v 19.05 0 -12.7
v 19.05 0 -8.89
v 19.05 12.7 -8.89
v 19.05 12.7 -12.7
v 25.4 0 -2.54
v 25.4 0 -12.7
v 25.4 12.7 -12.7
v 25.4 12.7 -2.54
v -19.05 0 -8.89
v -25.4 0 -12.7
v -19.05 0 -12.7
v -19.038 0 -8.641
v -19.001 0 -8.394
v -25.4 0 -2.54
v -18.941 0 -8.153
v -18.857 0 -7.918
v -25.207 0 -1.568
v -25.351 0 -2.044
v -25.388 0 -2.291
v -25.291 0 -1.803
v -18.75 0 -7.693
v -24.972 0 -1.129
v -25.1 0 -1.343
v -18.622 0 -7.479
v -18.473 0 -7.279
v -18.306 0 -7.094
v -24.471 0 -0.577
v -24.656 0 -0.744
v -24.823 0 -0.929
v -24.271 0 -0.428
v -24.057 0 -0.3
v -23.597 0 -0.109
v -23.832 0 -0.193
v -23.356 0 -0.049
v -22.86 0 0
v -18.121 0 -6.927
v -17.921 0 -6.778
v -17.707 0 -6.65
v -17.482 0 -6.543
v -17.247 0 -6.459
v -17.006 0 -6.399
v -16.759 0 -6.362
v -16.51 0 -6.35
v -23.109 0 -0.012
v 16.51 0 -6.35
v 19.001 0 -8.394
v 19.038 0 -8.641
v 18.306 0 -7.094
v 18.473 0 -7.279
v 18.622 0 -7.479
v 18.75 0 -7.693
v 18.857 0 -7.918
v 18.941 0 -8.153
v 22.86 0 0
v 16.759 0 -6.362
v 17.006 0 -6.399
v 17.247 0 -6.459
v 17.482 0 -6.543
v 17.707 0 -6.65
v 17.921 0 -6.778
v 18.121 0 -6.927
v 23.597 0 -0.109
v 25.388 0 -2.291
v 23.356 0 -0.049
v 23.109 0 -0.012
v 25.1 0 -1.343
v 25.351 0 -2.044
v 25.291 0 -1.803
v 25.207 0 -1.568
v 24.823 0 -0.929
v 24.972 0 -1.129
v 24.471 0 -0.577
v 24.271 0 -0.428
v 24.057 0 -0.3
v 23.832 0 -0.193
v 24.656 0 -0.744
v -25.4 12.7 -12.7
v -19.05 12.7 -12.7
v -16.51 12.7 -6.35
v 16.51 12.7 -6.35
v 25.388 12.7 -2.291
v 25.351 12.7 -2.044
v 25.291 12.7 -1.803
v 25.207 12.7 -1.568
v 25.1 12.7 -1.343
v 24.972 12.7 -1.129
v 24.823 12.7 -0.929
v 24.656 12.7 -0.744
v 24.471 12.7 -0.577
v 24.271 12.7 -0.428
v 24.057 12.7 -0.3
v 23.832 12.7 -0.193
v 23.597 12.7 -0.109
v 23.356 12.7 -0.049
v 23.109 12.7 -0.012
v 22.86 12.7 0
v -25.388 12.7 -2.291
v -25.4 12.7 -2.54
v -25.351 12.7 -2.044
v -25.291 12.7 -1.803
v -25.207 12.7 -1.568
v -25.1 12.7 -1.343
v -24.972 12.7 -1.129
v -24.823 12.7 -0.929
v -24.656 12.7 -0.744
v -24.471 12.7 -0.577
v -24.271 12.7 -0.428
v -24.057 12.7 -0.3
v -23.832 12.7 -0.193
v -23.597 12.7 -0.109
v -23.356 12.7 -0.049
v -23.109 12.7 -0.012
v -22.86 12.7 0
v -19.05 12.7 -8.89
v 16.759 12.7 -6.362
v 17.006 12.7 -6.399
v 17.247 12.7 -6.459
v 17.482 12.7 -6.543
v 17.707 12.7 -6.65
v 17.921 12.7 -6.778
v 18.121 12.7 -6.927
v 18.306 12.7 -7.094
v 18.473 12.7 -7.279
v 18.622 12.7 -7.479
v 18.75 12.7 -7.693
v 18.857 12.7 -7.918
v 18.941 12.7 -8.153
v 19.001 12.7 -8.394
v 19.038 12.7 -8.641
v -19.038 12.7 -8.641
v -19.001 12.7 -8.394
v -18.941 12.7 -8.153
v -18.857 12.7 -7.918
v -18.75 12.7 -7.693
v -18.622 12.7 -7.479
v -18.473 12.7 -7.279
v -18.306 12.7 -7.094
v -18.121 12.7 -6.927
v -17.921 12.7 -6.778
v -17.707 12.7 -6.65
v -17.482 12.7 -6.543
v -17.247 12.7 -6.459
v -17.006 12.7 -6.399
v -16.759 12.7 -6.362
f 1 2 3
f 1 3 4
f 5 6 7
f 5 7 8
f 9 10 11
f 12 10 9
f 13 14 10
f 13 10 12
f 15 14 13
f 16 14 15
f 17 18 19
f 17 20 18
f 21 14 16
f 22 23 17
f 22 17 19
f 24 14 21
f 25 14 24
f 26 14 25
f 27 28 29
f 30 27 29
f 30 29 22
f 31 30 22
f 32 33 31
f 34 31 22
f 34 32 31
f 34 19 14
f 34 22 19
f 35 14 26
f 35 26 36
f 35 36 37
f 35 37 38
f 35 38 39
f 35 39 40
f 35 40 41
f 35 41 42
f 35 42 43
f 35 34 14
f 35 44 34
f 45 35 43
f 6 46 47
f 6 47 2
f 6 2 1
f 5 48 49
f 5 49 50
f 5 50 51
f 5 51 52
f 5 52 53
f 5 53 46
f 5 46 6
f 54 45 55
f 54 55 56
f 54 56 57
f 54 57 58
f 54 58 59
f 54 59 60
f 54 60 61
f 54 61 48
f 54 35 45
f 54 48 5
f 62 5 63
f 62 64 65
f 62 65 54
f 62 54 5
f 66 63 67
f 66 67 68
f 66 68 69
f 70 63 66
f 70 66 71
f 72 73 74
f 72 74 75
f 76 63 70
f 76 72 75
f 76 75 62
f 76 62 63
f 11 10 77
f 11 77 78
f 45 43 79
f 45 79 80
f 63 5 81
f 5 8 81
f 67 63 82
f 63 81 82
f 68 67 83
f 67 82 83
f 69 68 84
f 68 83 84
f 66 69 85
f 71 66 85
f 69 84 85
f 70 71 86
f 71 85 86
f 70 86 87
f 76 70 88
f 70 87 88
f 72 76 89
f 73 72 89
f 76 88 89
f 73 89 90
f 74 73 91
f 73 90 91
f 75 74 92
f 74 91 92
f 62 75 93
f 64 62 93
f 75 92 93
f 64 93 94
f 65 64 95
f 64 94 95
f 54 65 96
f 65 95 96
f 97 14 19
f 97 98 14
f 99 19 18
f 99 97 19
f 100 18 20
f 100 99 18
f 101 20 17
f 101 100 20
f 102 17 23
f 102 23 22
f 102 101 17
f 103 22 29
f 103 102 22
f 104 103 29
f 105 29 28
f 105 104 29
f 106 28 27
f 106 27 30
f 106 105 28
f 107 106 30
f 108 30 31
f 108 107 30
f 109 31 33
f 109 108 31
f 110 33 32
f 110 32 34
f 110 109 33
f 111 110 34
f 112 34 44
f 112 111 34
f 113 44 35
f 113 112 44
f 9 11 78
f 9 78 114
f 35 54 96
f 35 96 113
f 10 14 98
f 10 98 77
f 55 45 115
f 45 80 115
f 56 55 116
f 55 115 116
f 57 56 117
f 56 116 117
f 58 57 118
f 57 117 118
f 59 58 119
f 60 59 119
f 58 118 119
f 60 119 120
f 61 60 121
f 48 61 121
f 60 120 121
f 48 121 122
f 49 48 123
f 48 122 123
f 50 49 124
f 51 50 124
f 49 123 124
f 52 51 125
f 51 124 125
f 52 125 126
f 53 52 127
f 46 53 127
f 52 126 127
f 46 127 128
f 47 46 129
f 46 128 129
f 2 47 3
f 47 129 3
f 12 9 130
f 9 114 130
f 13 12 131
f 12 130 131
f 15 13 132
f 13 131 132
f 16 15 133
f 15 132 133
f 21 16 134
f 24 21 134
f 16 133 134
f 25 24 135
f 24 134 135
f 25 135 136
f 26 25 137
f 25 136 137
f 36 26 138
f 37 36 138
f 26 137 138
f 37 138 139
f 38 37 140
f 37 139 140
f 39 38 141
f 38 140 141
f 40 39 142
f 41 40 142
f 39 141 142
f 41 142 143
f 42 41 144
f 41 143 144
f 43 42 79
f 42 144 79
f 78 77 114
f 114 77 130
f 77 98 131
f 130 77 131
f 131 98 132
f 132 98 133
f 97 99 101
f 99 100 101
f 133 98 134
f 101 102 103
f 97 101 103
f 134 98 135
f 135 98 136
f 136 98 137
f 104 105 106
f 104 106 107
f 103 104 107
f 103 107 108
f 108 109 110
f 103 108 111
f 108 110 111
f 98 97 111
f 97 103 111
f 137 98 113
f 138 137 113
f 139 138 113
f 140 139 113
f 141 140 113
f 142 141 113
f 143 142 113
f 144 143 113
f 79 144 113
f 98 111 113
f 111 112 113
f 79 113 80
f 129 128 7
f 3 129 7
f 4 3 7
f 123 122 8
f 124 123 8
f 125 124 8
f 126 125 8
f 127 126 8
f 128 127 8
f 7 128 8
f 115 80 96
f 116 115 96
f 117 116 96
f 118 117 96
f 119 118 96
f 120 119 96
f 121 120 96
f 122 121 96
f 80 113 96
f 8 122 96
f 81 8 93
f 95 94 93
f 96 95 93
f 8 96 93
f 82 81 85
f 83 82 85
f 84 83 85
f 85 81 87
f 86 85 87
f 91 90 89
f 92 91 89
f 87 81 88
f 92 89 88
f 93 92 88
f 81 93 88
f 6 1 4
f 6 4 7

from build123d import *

# Parameters (mm, degrees)
F1_DEPTH = 12.7
F2_R     = 2.54


with BuildPart() as f1:
    # F0 (on Front) → F1 (new body)
    with BuildSketch(Plane.XZ):
        Polygon((-25.4, 0), (-25.4, -12.7), (-19.05, -12.7), (-19.05, -6.35), (19.05, -6.35), (19.05, -12.7), (25.4, -12.7), (25.4, 0), align=None)
    extrude(amount=-F1_DEPTH)

    # F2
    f2_edges = [f1.edges().sort_by_distance(p)[0] for p in [
        (-19.05, 6.35, -6.35),
        (19.05, 6.35, -6.35),
        (-25.4, 6.35, 0),
        (25.4, 6.35, 0),
    ]]
    fillet(f2_edges, radius=F2_R)


solid = f1.part
